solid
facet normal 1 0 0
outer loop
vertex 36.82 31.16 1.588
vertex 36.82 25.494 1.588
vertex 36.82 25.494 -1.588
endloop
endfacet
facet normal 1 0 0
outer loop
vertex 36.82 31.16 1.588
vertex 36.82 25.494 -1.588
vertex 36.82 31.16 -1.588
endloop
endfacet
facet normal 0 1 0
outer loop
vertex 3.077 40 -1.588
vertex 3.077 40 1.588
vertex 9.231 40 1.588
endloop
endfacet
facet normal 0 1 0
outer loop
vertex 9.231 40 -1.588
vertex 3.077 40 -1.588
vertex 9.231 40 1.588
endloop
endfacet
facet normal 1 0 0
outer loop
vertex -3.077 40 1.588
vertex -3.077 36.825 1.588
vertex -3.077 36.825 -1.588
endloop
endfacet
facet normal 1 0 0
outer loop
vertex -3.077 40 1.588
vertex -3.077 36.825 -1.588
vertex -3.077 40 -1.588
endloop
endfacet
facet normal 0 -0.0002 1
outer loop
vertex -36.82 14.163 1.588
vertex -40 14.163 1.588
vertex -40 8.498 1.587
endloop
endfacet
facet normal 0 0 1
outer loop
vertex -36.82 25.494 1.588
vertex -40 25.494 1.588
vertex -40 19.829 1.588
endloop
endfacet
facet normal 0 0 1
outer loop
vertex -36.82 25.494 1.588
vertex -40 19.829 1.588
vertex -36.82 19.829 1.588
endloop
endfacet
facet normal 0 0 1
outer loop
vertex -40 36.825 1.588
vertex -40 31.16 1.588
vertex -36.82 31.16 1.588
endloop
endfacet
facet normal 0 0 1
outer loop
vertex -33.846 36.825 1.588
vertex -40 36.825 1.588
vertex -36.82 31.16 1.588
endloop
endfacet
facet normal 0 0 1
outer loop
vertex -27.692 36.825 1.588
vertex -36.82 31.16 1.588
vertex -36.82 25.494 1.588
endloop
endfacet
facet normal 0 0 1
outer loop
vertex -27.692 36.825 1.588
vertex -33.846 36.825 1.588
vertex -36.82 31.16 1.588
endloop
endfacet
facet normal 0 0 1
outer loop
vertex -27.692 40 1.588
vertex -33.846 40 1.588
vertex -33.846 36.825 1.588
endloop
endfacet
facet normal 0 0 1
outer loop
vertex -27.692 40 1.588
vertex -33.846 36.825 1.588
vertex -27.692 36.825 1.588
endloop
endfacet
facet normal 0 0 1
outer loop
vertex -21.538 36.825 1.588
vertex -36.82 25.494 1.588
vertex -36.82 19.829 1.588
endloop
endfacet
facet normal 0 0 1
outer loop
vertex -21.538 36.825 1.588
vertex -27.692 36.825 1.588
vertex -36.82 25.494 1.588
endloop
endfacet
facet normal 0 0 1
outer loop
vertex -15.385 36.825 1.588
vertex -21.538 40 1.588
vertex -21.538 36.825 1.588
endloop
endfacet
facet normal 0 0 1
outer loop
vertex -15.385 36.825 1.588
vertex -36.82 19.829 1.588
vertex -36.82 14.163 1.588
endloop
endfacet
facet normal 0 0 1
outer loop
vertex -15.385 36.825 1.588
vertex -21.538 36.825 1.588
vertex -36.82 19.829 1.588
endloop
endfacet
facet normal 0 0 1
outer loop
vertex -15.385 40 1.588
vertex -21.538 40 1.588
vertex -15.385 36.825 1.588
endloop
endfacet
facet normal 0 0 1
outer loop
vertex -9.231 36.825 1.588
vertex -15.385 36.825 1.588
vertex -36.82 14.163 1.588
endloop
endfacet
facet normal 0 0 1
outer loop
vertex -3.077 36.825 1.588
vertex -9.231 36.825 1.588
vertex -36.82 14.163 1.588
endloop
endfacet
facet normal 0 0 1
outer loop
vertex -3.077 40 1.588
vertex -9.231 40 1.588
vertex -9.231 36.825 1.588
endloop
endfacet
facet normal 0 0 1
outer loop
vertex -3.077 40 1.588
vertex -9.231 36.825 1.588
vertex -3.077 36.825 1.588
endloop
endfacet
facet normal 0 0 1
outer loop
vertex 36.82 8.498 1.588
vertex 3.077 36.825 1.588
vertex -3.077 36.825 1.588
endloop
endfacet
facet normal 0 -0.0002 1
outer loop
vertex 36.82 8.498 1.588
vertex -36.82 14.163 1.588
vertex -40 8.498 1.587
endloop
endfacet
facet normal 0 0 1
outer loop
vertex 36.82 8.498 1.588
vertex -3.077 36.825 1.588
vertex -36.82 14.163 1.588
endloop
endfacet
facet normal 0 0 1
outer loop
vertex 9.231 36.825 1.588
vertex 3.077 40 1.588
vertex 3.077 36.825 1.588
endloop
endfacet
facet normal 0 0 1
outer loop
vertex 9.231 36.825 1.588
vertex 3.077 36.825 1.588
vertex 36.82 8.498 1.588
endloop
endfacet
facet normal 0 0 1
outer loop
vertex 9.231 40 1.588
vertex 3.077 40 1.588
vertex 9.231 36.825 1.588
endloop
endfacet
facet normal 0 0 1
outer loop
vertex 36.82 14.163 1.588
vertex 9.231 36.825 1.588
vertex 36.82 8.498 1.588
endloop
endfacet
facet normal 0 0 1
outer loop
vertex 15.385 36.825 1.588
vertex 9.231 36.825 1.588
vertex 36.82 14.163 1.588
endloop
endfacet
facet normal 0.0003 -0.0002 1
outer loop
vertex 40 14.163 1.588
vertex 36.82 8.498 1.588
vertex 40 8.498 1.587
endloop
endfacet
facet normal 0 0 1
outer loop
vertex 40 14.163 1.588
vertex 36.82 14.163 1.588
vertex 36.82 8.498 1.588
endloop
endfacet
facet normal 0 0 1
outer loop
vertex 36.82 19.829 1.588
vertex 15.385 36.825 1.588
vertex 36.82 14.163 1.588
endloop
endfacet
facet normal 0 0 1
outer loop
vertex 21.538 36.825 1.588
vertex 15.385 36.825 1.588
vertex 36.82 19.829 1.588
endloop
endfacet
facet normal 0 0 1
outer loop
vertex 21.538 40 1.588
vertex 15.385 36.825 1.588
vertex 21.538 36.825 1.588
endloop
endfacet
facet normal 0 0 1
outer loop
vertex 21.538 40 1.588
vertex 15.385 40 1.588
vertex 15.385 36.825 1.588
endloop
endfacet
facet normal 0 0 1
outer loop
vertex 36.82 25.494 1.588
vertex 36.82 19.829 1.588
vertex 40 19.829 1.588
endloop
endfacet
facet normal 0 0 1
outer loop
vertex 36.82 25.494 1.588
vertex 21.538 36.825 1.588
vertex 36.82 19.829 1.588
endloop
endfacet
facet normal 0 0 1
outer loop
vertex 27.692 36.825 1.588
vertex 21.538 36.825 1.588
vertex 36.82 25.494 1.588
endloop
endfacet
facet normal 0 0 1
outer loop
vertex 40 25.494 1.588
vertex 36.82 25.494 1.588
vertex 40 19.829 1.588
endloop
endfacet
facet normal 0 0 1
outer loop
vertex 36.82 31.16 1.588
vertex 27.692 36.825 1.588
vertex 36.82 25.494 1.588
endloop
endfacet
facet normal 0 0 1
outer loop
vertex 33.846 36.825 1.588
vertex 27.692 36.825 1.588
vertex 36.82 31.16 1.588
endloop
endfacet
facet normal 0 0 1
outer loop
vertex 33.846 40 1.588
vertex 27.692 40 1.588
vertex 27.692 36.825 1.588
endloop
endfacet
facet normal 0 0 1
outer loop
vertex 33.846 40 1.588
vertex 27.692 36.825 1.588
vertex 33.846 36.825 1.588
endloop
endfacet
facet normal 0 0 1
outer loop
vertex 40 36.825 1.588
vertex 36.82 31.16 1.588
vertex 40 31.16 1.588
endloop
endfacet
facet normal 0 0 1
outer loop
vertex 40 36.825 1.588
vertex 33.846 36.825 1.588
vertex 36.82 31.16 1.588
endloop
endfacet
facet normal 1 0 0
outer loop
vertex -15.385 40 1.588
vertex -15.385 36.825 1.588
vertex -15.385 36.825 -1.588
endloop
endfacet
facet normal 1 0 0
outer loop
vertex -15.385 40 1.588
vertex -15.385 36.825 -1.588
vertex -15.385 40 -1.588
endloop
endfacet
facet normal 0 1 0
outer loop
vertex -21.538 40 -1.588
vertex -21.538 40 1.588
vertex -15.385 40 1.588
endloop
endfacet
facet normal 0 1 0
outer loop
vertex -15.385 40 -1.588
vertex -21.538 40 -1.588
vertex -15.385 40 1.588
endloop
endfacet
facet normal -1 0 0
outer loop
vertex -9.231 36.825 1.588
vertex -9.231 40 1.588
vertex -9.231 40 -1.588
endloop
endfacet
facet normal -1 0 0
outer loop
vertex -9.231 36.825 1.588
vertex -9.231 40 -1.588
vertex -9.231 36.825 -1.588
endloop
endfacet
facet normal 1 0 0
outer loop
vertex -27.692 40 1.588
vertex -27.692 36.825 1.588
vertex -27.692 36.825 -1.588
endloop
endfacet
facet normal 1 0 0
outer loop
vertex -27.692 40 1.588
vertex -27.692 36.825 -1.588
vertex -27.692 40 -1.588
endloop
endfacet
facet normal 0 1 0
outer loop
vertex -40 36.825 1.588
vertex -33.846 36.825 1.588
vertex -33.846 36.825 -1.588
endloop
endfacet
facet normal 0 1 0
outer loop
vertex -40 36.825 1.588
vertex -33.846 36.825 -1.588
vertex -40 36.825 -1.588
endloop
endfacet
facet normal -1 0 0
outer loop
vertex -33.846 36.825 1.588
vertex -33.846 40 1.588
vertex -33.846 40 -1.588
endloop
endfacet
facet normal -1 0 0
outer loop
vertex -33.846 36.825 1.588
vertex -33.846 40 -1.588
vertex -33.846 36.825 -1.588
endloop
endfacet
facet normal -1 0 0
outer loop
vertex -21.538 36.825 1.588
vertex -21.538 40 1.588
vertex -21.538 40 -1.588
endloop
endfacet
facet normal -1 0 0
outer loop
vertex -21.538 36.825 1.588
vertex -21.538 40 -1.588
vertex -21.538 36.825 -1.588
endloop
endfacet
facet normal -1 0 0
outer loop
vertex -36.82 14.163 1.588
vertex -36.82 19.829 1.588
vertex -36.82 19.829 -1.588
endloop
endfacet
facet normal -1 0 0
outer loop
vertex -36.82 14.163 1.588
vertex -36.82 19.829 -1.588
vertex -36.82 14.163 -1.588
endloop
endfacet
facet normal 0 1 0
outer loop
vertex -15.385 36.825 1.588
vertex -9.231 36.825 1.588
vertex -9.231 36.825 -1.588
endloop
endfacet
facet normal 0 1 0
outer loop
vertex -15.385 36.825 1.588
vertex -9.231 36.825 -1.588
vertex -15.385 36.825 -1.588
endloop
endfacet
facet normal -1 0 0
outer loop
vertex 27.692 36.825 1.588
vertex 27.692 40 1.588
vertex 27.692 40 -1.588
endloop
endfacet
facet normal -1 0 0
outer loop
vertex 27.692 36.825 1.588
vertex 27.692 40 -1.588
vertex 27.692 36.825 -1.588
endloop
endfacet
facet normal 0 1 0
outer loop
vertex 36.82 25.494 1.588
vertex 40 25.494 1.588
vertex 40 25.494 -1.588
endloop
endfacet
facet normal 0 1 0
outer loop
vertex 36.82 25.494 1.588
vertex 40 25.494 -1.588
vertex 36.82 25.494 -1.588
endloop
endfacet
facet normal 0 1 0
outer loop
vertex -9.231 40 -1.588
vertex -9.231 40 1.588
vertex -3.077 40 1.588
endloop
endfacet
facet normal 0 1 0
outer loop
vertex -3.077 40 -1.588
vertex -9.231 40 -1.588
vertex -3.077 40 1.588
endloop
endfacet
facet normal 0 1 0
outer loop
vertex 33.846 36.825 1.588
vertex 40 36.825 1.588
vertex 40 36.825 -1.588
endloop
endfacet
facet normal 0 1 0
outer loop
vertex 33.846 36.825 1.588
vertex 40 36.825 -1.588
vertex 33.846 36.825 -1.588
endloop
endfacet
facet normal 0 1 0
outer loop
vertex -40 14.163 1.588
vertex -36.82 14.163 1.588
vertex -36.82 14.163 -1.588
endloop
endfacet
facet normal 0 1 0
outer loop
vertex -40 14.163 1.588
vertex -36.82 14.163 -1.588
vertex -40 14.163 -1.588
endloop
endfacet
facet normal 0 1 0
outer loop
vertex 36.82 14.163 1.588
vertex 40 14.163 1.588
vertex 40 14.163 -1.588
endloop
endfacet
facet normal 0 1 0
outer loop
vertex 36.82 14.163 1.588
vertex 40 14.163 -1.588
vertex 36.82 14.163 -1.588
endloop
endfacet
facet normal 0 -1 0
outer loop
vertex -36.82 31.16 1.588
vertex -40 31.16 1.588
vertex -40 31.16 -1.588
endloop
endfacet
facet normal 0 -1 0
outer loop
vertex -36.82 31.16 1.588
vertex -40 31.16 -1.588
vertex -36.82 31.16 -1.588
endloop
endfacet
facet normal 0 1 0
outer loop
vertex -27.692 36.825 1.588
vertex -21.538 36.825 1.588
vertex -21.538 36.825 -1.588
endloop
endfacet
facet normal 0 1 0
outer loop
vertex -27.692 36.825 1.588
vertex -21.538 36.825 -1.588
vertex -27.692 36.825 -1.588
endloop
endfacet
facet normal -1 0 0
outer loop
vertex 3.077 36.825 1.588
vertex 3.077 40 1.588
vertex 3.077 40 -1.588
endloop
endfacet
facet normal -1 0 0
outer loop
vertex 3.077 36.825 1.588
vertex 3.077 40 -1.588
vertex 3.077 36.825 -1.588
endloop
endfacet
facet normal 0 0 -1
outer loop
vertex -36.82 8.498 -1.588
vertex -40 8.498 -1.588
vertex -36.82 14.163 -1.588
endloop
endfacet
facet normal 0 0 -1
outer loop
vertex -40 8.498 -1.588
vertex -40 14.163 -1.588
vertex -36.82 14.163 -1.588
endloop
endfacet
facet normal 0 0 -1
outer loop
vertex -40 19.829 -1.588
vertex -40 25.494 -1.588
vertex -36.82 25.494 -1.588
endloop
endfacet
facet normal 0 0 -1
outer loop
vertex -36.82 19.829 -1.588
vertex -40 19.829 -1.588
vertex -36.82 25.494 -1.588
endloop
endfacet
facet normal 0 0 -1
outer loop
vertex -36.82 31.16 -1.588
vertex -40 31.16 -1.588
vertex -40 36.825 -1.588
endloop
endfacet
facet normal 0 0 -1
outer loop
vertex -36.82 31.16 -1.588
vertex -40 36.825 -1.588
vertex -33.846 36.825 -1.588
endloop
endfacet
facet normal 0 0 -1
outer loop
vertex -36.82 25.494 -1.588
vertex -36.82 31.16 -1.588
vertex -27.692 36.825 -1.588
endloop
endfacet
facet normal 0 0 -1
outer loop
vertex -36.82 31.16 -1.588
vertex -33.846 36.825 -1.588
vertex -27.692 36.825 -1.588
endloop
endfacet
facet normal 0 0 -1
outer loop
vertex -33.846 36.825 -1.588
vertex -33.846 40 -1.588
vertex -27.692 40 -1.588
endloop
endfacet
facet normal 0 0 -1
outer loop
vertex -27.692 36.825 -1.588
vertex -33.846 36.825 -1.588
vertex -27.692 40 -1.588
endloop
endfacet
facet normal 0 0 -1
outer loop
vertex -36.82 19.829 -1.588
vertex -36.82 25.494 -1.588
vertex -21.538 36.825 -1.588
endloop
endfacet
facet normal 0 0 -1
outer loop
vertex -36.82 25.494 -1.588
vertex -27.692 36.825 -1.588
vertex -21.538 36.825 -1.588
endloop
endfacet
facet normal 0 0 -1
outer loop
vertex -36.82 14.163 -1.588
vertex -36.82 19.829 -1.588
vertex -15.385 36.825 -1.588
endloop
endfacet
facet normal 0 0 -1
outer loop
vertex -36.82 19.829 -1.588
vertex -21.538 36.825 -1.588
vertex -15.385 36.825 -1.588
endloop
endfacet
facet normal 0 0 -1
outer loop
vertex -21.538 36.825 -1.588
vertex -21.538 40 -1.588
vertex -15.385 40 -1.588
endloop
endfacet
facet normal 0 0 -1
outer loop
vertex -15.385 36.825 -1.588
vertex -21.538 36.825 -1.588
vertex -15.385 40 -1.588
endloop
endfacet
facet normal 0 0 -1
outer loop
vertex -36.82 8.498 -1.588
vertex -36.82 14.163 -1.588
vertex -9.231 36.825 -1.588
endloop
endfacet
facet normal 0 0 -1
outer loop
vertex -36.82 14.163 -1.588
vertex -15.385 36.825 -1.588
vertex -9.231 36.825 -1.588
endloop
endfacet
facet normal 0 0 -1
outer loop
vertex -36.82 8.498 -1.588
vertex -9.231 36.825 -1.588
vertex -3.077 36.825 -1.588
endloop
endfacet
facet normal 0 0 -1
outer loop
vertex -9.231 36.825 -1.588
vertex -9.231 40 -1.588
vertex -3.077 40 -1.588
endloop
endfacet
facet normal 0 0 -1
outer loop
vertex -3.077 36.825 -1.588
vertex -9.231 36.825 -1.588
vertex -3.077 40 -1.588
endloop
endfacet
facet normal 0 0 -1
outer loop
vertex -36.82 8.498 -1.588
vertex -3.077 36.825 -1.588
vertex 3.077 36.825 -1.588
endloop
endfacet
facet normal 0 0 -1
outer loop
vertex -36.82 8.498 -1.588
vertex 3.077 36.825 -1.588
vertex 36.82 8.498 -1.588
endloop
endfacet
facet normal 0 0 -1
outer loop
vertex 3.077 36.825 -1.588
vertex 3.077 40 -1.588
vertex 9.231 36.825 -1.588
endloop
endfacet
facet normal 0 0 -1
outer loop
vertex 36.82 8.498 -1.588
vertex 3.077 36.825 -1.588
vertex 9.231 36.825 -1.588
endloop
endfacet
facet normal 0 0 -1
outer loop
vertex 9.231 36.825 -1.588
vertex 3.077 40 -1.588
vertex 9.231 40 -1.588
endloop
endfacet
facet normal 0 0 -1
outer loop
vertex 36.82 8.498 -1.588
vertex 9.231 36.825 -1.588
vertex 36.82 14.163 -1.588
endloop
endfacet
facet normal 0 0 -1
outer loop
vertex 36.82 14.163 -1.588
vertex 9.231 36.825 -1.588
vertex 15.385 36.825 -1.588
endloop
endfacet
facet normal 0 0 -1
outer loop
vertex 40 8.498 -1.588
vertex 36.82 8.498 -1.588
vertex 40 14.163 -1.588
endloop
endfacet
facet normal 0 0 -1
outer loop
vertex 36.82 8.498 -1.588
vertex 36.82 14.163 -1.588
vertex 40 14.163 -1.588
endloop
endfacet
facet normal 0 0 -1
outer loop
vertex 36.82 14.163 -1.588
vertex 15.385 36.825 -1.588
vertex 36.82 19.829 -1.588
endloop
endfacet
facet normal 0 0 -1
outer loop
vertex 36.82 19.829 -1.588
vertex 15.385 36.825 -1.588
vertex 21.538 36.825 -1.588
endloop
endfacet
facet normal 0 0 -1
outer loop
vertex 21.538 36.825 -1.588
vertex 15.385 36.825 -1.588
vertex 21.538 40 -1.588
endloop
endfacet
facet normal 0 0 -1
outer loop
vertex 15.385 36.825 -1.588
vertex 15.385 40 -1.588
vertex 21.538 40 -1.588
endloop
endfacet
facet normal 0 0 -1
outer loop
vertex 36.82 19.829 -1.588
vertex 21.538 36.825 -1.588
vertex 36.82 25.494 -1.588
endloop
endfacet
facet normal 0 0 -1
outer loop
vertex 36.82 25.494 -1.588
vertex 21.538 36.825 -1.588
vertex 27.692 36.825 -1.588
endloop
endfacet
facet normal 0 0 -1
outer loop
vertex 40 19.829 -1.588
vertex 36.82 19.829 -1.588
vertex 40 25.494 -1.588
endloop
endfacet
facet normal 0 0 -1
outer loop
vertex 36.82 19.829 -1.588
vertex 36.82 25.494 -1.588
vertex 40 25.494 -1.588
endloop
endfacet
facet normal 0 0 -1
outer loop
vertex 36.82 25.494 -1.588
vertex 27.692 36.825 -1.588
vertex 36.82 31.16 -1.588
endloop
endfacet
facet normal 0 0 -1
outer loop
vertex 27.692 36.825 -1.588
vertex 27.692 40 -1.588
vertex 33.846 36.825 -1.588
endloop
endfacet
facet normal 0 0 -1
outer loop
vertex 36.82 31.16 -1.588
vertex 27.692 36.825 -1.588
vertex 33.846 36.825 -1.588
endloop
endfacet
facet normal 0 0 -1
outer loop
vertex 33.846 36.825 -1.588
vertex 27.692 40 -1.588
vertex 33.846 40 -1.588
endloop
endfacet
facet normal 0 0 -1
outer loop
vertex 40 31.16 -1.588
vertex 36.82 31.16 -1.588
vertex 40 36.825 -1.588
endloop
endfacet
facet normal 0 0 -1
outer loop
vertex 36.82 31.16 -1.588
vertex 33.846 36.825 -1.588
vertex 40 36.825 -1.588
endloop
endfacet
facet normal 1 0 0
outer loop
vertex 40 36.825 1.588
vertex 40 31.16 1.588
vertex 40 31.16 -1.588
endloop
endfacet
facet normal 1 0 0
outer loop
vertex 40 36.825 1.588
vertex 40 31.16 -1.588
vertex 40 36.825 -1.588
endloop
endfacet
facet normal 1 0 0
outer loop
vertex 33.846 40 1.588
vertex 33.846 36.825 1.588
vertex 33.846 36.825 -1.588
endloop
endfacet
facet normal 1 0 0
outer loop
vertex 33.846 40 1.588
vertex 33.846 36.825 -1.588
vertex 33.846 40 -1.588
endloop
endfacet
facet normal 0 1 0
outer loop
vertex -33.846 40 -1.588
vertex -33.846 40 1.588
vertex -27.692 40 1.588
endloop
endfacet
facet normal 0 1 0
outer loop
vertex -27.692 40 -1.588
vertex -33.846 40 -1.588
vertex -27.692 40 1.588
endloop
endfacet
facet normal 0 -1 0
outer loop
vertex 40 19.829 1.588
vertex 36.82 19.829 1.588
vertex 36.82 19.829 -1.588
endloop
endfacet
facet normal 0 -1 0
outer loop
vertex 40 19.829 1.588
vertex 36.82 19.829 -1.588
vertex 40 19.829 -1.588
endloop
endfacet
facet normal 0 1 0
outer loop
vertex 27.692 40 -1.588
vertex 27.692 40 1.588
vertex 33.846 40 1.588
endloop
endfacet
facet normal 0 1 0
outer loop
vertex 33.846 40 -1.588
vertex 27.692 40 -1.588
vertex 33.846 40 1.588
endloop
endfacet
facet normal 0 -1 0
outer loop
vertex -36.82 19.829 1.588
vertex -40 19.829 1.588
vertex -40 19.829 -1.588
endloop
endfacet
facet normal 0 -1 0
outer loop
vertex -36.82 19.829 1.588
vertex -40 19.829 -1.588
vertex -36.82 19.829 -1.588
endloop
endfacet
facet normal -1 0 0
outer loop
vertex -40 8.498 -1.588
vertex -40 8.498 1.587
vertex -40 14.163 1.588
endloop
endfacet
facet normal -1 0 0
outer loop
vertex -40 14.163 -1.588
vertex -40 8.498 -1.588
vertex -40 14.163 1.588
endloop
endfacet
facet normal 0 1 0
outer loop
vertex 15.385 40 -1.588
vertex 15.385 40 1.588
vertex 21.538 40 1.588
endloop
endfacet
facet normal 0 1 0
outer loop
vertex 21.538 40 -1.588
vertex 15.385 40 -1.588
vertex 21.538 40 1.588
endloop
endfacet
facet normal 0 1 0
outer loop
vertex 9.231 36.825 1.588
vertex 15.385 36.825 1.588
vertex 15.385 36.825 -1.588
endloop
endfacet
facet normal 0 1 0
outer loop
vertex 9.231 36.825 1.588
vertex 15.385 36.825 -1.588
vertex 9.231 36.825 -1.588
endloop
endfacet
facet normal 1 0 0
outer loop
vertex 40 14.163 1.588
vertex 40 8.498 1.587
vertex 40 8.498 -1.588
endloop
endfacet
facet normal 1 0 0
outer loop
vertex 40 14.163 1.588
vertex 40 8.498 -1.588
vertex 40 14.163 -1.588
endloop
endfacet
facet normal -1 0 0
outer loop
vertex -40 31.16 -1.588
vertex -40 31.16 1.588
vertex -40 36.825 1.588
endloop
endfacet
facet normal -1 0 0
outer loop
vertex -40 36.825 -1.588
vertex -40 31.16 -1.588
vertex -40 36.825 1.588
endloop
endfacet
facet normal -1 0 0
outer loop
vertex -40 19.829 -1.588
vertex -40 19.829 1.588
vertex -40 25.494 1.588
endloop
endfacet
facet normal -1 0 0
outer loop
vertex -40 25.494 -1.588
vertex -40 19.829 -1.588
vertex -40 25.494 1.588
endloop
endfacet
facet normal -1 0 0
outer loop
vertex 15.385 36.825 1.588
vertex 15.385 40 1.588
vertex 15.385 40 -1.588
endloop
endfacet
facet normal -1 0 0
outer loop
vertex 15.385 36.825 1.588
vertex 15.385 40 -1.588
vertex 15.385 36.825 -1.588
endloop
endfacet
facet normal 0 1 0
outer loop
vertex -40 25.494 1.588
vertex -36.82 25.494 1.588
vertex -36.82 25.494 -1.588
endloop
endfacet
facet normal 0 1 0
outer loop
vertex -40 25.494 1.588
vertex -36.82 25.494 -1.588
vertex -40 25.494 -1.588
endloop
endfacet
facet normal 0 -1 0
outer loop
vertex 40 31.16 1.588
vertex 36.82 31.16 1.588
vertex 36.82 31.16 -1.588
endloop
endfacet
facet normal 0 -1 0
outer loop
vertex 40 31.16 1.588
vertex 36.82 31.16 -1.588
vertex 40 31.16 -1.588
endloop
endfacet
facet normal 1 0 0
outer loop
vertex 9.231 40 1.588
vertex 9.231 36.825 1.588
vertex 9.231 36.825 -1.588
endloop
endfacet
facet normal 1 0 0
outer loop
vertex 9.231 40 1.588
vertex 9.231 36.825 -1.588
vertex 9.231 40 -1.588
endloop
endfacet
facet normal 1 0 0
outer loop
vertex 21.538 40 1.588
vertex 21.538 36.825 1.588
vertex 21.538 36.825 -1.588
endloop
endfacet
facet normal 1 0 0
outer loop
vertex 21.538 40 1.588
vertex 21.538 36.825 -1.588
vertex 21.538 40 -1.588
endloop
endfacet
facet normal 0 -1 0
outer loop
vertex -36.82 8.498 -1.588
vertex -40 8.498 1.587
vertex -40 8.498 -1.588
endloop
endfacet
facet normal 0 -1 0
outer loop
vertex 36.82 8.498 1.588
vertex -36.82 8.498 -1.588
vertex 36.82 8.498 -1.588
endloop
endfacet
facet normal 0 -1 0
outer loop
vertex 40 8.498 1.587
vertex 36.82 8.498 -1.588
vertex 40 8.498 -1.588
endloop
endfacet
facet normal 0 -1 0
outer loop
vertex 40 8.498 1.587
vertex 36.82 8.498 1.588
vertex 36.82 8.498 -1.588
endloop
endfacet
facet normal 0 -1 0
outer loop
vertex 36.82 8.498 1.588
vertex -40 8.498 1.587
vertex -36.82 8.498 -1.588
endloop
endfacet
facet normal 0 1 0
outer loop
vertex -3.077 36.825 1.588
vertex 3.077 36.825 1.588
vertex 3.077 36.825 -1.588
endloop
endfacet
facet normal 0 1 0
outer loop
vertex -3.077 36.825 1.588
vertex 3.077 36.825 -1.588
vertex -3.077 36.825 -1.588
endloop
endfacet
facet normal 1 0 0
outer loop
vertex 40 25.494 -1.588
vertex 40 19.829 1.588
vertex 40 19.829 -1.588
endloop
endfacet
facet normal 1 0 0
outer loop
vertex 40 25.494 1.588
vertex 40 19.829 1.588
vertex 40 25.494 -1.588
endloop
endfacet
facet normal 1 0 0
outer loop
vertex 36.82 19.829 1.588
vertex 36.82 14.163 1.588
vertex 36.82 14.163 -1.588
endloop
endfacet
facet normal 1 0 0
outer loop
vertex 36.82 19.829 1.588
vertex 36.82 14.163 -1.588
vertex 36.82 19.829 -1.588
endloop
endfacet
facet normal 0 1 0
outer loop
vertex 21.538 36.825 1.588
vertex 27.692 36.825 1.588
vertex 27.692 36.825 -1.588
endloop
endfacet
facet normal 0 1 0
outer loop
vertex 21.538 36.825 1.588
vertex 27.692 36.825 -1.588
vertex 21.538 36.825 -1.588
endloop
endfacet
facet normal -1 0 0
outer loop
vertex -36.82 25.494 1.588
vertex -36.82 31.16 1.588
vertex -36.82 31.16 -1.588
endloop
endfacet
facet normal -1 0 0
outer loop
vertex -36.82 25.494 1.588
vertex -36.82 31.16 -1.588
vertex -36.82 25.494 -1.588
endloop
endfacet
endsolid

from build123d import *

# Parameters (mm, degrees)
SKETCH1_W           = 80
SKETCH1_H           = 80
BOSS_EXTRUDE1_DEPTH = 1.5875
SKETCH2_OUTSIDE_W   = 104.636
SKETCH2_OUTSIDE_H   = 104.636
CUT_EXTRUDE2_DEPTH  = 10
SKETCH3_W           = 80
SKETCH3_H           = 48.498076923
CUT_EXTRUDE3_DEPTH  = 57.657573413


with BuildPart() as part:
    # Sketch1 → Boss-Extrude1 (new, symmetric)
    with BuildSketch(Plane.XY):
        Rectangle(SKETCH1_W, SKETCH1_H)
    extrude(amount=BOSS_EXTRUDE1_DEPTH, both=True)

    # Sketch2 outside → Cut-Extrude2 (cut)
    with BuildSketch(Plane.XY.offset(1.5875)):
        Rectangle(SKETCH2_OUTSIDE_W, SKETCH2_OUTSIDE_H)
        Polygon((33.846153846, -36.825), (40, -36.825), (40, -31.159615385), (36.82, -31.159615385), (36.82, -25.494230769), (40, -25.494230769), (40, -19.828846154), (36.82, -19.828846154), (36.82, -14.163461538), (40, -14.163461538), (40, -8.498076923), (36.82, -8.498076923), (36.82, -2.832692308), (40, -2.832692308), (40, 2.832692308), (36.82, 2.832692308), (36.82, 8.498076923), (40, 8.498076923), (40, 14.163461538), (36.82, 14.163461538), (36.82, 19.828846154), (40, 19.828846154), (40, 25.494230769), (36.82, 25.494230769), (36.82, 31.159615385), (40, 31.159615385), (40, 36.825), (33.846153846, 36.825), (33.846153846, 40), (27.692307692, 40), (27.692307692, 36.825), (21.538461538, 36.825), (21.538461538, 40), (15.384615385, 40), (15.384615385, 36.825), (9.230769231, 36.825), (9.230769231, 40), (3.076923077, 40), (3.076923077, 36.825), (-3.076923077, 36.825), (-3.076923077, 40), (-9.230769231, 40), (-9.230769231, 36.825), (-15.384615385, 36.825), (-15.384615385, 40), (-21.538461538, 40), (-21.538461538, 36.825), (-27.692307692, 36.825), (-27.692307692, 40), (-33.846153846, 40), (-33.846153846, 36.825), (-40, 36.825), (-40, 31.159615385), (-36.82, 31.159615385), (-36.82, 25.494230769), (-40, 25.494230769), (-40, 19.828846154), (-36.82, 19.828846154), (-36.82, 14.163461538), (-40, 14.163461538), (-40, 8.498076923), (-36.82, 8.498076923), (-36.82, 2.832692308), (-40, 2.832692308), (-40, -2.832692308), (-36.82, -2.832692308), (-36.82, -8.498076923), (-40, -8.498076923), (-40, -14.163461538), (-36.82, -14.163461538), (-36.82, -19.828846154), (-40, -19.828846154), (-40, -25.494230769), (-36.82, -25.494230769), (-36.82, -31.159615385), (-40, -31.159615385), (-40, -36.825), (-33.846153846, -36.825), (-33.846153846, -40), (-27.692307692, -40), (-27.692307692, -36.825), (-21.538461538, -36.825), (-21.538461538, -40), (-15.384615385, -40), (-15.384615385, -36.825), (-9.230769231, -36.825), (-9.230769231, -40), (-3.076923077, -40), (-3.076923077, -36.825), (3.076923077, -36.825), (3.076923077, -40), (9.230769231, -40), (9.230769231, -36.825), (15.384615385, -36.825), (15.384615385, -40), (21.538461538, -40), (21.538461538, -36.825), (27.692307692, -36.825), (27.692307692, -40), (33.846153846, -40), align=None, mode=Mode.SUBTRACT)
    extrude(amount=-CUT_EXTRUDE2_DEPTH, mode=Mode.SUBTRACT)

    # Sketch3 → Cut-Extrude3 (cut, through all)
    with BuildSketch(Plane.XY.offset(1.5875)):
        with Locations((0, -15.750961539)):
            Rectangle(SKETCH3_W, SKETCH3_H)
    extrude(amount=-CUT_EXTRUDE3_DEPTH, mode=Mode.SUBTRACT)


solid = part.part
